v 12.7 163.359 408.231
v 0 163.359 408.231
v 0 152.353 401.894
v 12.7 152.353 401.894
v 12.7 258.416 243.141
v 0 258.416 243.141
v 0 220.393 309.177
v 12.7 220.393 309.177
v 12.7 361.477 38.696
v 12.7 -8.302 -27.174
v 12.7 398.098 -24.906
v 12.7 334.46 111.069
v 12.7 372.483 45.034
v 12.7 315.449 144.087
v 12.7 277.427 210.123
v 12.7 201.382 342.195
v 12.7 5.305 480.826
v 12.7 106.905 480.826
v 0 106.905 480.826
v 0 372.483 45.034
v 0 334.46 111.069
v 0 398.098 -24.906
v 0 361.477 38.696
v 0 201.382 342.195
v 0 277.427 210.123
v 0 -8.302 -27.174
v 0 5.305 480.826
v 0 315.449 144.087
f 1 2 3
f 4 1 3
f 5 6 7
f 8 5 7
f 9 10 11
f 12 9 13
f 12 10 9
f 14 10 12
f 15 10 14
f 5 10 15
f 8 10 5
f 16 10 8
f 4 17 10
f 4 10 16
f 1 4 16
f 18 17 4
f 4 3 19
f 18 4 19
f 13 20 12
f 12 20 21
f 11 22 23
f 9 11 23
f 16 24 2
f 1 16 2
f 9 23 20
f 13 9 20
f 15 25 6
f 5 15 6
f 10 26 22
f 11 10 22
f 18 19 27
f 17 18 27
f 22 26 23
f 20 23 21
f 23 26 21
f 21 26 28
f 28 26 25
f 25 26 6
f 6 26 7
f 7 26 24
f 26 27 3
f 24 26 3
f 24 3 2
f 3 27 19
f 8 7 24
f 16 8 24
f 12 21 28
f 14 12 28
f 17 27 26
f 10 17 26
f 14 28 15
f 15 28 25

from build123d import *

# Parameters (mm, degrees)
F1_DEPTH = 12.7


with BuildPart() as f1:
    # F0 (on Right) → F1 (new body)
    with BuildSketch(Plane.YZ):
        Polygon((5.305482, 480.825944), (-8.301662, -27.174056), (398.098338, -24.906198), (361.476894, 38.696464), (152.353483, 401.893668), (106.905482, 480.825944), align=None)
        Polygon((152.353483, 401.893668), (361.476894, 38.696464), (372.48287, 45.033538), (334.460432, 111.069393), (315.449213, 144.08732), (277.426774, 210.123176), (258.415555, 243.141103), (220.393116, 309.176958), (201.381897, 342.194886), (163.359459, 408.230741), align=None)
    extrude(amount=F1_DEPTH)


solid = f1.part
